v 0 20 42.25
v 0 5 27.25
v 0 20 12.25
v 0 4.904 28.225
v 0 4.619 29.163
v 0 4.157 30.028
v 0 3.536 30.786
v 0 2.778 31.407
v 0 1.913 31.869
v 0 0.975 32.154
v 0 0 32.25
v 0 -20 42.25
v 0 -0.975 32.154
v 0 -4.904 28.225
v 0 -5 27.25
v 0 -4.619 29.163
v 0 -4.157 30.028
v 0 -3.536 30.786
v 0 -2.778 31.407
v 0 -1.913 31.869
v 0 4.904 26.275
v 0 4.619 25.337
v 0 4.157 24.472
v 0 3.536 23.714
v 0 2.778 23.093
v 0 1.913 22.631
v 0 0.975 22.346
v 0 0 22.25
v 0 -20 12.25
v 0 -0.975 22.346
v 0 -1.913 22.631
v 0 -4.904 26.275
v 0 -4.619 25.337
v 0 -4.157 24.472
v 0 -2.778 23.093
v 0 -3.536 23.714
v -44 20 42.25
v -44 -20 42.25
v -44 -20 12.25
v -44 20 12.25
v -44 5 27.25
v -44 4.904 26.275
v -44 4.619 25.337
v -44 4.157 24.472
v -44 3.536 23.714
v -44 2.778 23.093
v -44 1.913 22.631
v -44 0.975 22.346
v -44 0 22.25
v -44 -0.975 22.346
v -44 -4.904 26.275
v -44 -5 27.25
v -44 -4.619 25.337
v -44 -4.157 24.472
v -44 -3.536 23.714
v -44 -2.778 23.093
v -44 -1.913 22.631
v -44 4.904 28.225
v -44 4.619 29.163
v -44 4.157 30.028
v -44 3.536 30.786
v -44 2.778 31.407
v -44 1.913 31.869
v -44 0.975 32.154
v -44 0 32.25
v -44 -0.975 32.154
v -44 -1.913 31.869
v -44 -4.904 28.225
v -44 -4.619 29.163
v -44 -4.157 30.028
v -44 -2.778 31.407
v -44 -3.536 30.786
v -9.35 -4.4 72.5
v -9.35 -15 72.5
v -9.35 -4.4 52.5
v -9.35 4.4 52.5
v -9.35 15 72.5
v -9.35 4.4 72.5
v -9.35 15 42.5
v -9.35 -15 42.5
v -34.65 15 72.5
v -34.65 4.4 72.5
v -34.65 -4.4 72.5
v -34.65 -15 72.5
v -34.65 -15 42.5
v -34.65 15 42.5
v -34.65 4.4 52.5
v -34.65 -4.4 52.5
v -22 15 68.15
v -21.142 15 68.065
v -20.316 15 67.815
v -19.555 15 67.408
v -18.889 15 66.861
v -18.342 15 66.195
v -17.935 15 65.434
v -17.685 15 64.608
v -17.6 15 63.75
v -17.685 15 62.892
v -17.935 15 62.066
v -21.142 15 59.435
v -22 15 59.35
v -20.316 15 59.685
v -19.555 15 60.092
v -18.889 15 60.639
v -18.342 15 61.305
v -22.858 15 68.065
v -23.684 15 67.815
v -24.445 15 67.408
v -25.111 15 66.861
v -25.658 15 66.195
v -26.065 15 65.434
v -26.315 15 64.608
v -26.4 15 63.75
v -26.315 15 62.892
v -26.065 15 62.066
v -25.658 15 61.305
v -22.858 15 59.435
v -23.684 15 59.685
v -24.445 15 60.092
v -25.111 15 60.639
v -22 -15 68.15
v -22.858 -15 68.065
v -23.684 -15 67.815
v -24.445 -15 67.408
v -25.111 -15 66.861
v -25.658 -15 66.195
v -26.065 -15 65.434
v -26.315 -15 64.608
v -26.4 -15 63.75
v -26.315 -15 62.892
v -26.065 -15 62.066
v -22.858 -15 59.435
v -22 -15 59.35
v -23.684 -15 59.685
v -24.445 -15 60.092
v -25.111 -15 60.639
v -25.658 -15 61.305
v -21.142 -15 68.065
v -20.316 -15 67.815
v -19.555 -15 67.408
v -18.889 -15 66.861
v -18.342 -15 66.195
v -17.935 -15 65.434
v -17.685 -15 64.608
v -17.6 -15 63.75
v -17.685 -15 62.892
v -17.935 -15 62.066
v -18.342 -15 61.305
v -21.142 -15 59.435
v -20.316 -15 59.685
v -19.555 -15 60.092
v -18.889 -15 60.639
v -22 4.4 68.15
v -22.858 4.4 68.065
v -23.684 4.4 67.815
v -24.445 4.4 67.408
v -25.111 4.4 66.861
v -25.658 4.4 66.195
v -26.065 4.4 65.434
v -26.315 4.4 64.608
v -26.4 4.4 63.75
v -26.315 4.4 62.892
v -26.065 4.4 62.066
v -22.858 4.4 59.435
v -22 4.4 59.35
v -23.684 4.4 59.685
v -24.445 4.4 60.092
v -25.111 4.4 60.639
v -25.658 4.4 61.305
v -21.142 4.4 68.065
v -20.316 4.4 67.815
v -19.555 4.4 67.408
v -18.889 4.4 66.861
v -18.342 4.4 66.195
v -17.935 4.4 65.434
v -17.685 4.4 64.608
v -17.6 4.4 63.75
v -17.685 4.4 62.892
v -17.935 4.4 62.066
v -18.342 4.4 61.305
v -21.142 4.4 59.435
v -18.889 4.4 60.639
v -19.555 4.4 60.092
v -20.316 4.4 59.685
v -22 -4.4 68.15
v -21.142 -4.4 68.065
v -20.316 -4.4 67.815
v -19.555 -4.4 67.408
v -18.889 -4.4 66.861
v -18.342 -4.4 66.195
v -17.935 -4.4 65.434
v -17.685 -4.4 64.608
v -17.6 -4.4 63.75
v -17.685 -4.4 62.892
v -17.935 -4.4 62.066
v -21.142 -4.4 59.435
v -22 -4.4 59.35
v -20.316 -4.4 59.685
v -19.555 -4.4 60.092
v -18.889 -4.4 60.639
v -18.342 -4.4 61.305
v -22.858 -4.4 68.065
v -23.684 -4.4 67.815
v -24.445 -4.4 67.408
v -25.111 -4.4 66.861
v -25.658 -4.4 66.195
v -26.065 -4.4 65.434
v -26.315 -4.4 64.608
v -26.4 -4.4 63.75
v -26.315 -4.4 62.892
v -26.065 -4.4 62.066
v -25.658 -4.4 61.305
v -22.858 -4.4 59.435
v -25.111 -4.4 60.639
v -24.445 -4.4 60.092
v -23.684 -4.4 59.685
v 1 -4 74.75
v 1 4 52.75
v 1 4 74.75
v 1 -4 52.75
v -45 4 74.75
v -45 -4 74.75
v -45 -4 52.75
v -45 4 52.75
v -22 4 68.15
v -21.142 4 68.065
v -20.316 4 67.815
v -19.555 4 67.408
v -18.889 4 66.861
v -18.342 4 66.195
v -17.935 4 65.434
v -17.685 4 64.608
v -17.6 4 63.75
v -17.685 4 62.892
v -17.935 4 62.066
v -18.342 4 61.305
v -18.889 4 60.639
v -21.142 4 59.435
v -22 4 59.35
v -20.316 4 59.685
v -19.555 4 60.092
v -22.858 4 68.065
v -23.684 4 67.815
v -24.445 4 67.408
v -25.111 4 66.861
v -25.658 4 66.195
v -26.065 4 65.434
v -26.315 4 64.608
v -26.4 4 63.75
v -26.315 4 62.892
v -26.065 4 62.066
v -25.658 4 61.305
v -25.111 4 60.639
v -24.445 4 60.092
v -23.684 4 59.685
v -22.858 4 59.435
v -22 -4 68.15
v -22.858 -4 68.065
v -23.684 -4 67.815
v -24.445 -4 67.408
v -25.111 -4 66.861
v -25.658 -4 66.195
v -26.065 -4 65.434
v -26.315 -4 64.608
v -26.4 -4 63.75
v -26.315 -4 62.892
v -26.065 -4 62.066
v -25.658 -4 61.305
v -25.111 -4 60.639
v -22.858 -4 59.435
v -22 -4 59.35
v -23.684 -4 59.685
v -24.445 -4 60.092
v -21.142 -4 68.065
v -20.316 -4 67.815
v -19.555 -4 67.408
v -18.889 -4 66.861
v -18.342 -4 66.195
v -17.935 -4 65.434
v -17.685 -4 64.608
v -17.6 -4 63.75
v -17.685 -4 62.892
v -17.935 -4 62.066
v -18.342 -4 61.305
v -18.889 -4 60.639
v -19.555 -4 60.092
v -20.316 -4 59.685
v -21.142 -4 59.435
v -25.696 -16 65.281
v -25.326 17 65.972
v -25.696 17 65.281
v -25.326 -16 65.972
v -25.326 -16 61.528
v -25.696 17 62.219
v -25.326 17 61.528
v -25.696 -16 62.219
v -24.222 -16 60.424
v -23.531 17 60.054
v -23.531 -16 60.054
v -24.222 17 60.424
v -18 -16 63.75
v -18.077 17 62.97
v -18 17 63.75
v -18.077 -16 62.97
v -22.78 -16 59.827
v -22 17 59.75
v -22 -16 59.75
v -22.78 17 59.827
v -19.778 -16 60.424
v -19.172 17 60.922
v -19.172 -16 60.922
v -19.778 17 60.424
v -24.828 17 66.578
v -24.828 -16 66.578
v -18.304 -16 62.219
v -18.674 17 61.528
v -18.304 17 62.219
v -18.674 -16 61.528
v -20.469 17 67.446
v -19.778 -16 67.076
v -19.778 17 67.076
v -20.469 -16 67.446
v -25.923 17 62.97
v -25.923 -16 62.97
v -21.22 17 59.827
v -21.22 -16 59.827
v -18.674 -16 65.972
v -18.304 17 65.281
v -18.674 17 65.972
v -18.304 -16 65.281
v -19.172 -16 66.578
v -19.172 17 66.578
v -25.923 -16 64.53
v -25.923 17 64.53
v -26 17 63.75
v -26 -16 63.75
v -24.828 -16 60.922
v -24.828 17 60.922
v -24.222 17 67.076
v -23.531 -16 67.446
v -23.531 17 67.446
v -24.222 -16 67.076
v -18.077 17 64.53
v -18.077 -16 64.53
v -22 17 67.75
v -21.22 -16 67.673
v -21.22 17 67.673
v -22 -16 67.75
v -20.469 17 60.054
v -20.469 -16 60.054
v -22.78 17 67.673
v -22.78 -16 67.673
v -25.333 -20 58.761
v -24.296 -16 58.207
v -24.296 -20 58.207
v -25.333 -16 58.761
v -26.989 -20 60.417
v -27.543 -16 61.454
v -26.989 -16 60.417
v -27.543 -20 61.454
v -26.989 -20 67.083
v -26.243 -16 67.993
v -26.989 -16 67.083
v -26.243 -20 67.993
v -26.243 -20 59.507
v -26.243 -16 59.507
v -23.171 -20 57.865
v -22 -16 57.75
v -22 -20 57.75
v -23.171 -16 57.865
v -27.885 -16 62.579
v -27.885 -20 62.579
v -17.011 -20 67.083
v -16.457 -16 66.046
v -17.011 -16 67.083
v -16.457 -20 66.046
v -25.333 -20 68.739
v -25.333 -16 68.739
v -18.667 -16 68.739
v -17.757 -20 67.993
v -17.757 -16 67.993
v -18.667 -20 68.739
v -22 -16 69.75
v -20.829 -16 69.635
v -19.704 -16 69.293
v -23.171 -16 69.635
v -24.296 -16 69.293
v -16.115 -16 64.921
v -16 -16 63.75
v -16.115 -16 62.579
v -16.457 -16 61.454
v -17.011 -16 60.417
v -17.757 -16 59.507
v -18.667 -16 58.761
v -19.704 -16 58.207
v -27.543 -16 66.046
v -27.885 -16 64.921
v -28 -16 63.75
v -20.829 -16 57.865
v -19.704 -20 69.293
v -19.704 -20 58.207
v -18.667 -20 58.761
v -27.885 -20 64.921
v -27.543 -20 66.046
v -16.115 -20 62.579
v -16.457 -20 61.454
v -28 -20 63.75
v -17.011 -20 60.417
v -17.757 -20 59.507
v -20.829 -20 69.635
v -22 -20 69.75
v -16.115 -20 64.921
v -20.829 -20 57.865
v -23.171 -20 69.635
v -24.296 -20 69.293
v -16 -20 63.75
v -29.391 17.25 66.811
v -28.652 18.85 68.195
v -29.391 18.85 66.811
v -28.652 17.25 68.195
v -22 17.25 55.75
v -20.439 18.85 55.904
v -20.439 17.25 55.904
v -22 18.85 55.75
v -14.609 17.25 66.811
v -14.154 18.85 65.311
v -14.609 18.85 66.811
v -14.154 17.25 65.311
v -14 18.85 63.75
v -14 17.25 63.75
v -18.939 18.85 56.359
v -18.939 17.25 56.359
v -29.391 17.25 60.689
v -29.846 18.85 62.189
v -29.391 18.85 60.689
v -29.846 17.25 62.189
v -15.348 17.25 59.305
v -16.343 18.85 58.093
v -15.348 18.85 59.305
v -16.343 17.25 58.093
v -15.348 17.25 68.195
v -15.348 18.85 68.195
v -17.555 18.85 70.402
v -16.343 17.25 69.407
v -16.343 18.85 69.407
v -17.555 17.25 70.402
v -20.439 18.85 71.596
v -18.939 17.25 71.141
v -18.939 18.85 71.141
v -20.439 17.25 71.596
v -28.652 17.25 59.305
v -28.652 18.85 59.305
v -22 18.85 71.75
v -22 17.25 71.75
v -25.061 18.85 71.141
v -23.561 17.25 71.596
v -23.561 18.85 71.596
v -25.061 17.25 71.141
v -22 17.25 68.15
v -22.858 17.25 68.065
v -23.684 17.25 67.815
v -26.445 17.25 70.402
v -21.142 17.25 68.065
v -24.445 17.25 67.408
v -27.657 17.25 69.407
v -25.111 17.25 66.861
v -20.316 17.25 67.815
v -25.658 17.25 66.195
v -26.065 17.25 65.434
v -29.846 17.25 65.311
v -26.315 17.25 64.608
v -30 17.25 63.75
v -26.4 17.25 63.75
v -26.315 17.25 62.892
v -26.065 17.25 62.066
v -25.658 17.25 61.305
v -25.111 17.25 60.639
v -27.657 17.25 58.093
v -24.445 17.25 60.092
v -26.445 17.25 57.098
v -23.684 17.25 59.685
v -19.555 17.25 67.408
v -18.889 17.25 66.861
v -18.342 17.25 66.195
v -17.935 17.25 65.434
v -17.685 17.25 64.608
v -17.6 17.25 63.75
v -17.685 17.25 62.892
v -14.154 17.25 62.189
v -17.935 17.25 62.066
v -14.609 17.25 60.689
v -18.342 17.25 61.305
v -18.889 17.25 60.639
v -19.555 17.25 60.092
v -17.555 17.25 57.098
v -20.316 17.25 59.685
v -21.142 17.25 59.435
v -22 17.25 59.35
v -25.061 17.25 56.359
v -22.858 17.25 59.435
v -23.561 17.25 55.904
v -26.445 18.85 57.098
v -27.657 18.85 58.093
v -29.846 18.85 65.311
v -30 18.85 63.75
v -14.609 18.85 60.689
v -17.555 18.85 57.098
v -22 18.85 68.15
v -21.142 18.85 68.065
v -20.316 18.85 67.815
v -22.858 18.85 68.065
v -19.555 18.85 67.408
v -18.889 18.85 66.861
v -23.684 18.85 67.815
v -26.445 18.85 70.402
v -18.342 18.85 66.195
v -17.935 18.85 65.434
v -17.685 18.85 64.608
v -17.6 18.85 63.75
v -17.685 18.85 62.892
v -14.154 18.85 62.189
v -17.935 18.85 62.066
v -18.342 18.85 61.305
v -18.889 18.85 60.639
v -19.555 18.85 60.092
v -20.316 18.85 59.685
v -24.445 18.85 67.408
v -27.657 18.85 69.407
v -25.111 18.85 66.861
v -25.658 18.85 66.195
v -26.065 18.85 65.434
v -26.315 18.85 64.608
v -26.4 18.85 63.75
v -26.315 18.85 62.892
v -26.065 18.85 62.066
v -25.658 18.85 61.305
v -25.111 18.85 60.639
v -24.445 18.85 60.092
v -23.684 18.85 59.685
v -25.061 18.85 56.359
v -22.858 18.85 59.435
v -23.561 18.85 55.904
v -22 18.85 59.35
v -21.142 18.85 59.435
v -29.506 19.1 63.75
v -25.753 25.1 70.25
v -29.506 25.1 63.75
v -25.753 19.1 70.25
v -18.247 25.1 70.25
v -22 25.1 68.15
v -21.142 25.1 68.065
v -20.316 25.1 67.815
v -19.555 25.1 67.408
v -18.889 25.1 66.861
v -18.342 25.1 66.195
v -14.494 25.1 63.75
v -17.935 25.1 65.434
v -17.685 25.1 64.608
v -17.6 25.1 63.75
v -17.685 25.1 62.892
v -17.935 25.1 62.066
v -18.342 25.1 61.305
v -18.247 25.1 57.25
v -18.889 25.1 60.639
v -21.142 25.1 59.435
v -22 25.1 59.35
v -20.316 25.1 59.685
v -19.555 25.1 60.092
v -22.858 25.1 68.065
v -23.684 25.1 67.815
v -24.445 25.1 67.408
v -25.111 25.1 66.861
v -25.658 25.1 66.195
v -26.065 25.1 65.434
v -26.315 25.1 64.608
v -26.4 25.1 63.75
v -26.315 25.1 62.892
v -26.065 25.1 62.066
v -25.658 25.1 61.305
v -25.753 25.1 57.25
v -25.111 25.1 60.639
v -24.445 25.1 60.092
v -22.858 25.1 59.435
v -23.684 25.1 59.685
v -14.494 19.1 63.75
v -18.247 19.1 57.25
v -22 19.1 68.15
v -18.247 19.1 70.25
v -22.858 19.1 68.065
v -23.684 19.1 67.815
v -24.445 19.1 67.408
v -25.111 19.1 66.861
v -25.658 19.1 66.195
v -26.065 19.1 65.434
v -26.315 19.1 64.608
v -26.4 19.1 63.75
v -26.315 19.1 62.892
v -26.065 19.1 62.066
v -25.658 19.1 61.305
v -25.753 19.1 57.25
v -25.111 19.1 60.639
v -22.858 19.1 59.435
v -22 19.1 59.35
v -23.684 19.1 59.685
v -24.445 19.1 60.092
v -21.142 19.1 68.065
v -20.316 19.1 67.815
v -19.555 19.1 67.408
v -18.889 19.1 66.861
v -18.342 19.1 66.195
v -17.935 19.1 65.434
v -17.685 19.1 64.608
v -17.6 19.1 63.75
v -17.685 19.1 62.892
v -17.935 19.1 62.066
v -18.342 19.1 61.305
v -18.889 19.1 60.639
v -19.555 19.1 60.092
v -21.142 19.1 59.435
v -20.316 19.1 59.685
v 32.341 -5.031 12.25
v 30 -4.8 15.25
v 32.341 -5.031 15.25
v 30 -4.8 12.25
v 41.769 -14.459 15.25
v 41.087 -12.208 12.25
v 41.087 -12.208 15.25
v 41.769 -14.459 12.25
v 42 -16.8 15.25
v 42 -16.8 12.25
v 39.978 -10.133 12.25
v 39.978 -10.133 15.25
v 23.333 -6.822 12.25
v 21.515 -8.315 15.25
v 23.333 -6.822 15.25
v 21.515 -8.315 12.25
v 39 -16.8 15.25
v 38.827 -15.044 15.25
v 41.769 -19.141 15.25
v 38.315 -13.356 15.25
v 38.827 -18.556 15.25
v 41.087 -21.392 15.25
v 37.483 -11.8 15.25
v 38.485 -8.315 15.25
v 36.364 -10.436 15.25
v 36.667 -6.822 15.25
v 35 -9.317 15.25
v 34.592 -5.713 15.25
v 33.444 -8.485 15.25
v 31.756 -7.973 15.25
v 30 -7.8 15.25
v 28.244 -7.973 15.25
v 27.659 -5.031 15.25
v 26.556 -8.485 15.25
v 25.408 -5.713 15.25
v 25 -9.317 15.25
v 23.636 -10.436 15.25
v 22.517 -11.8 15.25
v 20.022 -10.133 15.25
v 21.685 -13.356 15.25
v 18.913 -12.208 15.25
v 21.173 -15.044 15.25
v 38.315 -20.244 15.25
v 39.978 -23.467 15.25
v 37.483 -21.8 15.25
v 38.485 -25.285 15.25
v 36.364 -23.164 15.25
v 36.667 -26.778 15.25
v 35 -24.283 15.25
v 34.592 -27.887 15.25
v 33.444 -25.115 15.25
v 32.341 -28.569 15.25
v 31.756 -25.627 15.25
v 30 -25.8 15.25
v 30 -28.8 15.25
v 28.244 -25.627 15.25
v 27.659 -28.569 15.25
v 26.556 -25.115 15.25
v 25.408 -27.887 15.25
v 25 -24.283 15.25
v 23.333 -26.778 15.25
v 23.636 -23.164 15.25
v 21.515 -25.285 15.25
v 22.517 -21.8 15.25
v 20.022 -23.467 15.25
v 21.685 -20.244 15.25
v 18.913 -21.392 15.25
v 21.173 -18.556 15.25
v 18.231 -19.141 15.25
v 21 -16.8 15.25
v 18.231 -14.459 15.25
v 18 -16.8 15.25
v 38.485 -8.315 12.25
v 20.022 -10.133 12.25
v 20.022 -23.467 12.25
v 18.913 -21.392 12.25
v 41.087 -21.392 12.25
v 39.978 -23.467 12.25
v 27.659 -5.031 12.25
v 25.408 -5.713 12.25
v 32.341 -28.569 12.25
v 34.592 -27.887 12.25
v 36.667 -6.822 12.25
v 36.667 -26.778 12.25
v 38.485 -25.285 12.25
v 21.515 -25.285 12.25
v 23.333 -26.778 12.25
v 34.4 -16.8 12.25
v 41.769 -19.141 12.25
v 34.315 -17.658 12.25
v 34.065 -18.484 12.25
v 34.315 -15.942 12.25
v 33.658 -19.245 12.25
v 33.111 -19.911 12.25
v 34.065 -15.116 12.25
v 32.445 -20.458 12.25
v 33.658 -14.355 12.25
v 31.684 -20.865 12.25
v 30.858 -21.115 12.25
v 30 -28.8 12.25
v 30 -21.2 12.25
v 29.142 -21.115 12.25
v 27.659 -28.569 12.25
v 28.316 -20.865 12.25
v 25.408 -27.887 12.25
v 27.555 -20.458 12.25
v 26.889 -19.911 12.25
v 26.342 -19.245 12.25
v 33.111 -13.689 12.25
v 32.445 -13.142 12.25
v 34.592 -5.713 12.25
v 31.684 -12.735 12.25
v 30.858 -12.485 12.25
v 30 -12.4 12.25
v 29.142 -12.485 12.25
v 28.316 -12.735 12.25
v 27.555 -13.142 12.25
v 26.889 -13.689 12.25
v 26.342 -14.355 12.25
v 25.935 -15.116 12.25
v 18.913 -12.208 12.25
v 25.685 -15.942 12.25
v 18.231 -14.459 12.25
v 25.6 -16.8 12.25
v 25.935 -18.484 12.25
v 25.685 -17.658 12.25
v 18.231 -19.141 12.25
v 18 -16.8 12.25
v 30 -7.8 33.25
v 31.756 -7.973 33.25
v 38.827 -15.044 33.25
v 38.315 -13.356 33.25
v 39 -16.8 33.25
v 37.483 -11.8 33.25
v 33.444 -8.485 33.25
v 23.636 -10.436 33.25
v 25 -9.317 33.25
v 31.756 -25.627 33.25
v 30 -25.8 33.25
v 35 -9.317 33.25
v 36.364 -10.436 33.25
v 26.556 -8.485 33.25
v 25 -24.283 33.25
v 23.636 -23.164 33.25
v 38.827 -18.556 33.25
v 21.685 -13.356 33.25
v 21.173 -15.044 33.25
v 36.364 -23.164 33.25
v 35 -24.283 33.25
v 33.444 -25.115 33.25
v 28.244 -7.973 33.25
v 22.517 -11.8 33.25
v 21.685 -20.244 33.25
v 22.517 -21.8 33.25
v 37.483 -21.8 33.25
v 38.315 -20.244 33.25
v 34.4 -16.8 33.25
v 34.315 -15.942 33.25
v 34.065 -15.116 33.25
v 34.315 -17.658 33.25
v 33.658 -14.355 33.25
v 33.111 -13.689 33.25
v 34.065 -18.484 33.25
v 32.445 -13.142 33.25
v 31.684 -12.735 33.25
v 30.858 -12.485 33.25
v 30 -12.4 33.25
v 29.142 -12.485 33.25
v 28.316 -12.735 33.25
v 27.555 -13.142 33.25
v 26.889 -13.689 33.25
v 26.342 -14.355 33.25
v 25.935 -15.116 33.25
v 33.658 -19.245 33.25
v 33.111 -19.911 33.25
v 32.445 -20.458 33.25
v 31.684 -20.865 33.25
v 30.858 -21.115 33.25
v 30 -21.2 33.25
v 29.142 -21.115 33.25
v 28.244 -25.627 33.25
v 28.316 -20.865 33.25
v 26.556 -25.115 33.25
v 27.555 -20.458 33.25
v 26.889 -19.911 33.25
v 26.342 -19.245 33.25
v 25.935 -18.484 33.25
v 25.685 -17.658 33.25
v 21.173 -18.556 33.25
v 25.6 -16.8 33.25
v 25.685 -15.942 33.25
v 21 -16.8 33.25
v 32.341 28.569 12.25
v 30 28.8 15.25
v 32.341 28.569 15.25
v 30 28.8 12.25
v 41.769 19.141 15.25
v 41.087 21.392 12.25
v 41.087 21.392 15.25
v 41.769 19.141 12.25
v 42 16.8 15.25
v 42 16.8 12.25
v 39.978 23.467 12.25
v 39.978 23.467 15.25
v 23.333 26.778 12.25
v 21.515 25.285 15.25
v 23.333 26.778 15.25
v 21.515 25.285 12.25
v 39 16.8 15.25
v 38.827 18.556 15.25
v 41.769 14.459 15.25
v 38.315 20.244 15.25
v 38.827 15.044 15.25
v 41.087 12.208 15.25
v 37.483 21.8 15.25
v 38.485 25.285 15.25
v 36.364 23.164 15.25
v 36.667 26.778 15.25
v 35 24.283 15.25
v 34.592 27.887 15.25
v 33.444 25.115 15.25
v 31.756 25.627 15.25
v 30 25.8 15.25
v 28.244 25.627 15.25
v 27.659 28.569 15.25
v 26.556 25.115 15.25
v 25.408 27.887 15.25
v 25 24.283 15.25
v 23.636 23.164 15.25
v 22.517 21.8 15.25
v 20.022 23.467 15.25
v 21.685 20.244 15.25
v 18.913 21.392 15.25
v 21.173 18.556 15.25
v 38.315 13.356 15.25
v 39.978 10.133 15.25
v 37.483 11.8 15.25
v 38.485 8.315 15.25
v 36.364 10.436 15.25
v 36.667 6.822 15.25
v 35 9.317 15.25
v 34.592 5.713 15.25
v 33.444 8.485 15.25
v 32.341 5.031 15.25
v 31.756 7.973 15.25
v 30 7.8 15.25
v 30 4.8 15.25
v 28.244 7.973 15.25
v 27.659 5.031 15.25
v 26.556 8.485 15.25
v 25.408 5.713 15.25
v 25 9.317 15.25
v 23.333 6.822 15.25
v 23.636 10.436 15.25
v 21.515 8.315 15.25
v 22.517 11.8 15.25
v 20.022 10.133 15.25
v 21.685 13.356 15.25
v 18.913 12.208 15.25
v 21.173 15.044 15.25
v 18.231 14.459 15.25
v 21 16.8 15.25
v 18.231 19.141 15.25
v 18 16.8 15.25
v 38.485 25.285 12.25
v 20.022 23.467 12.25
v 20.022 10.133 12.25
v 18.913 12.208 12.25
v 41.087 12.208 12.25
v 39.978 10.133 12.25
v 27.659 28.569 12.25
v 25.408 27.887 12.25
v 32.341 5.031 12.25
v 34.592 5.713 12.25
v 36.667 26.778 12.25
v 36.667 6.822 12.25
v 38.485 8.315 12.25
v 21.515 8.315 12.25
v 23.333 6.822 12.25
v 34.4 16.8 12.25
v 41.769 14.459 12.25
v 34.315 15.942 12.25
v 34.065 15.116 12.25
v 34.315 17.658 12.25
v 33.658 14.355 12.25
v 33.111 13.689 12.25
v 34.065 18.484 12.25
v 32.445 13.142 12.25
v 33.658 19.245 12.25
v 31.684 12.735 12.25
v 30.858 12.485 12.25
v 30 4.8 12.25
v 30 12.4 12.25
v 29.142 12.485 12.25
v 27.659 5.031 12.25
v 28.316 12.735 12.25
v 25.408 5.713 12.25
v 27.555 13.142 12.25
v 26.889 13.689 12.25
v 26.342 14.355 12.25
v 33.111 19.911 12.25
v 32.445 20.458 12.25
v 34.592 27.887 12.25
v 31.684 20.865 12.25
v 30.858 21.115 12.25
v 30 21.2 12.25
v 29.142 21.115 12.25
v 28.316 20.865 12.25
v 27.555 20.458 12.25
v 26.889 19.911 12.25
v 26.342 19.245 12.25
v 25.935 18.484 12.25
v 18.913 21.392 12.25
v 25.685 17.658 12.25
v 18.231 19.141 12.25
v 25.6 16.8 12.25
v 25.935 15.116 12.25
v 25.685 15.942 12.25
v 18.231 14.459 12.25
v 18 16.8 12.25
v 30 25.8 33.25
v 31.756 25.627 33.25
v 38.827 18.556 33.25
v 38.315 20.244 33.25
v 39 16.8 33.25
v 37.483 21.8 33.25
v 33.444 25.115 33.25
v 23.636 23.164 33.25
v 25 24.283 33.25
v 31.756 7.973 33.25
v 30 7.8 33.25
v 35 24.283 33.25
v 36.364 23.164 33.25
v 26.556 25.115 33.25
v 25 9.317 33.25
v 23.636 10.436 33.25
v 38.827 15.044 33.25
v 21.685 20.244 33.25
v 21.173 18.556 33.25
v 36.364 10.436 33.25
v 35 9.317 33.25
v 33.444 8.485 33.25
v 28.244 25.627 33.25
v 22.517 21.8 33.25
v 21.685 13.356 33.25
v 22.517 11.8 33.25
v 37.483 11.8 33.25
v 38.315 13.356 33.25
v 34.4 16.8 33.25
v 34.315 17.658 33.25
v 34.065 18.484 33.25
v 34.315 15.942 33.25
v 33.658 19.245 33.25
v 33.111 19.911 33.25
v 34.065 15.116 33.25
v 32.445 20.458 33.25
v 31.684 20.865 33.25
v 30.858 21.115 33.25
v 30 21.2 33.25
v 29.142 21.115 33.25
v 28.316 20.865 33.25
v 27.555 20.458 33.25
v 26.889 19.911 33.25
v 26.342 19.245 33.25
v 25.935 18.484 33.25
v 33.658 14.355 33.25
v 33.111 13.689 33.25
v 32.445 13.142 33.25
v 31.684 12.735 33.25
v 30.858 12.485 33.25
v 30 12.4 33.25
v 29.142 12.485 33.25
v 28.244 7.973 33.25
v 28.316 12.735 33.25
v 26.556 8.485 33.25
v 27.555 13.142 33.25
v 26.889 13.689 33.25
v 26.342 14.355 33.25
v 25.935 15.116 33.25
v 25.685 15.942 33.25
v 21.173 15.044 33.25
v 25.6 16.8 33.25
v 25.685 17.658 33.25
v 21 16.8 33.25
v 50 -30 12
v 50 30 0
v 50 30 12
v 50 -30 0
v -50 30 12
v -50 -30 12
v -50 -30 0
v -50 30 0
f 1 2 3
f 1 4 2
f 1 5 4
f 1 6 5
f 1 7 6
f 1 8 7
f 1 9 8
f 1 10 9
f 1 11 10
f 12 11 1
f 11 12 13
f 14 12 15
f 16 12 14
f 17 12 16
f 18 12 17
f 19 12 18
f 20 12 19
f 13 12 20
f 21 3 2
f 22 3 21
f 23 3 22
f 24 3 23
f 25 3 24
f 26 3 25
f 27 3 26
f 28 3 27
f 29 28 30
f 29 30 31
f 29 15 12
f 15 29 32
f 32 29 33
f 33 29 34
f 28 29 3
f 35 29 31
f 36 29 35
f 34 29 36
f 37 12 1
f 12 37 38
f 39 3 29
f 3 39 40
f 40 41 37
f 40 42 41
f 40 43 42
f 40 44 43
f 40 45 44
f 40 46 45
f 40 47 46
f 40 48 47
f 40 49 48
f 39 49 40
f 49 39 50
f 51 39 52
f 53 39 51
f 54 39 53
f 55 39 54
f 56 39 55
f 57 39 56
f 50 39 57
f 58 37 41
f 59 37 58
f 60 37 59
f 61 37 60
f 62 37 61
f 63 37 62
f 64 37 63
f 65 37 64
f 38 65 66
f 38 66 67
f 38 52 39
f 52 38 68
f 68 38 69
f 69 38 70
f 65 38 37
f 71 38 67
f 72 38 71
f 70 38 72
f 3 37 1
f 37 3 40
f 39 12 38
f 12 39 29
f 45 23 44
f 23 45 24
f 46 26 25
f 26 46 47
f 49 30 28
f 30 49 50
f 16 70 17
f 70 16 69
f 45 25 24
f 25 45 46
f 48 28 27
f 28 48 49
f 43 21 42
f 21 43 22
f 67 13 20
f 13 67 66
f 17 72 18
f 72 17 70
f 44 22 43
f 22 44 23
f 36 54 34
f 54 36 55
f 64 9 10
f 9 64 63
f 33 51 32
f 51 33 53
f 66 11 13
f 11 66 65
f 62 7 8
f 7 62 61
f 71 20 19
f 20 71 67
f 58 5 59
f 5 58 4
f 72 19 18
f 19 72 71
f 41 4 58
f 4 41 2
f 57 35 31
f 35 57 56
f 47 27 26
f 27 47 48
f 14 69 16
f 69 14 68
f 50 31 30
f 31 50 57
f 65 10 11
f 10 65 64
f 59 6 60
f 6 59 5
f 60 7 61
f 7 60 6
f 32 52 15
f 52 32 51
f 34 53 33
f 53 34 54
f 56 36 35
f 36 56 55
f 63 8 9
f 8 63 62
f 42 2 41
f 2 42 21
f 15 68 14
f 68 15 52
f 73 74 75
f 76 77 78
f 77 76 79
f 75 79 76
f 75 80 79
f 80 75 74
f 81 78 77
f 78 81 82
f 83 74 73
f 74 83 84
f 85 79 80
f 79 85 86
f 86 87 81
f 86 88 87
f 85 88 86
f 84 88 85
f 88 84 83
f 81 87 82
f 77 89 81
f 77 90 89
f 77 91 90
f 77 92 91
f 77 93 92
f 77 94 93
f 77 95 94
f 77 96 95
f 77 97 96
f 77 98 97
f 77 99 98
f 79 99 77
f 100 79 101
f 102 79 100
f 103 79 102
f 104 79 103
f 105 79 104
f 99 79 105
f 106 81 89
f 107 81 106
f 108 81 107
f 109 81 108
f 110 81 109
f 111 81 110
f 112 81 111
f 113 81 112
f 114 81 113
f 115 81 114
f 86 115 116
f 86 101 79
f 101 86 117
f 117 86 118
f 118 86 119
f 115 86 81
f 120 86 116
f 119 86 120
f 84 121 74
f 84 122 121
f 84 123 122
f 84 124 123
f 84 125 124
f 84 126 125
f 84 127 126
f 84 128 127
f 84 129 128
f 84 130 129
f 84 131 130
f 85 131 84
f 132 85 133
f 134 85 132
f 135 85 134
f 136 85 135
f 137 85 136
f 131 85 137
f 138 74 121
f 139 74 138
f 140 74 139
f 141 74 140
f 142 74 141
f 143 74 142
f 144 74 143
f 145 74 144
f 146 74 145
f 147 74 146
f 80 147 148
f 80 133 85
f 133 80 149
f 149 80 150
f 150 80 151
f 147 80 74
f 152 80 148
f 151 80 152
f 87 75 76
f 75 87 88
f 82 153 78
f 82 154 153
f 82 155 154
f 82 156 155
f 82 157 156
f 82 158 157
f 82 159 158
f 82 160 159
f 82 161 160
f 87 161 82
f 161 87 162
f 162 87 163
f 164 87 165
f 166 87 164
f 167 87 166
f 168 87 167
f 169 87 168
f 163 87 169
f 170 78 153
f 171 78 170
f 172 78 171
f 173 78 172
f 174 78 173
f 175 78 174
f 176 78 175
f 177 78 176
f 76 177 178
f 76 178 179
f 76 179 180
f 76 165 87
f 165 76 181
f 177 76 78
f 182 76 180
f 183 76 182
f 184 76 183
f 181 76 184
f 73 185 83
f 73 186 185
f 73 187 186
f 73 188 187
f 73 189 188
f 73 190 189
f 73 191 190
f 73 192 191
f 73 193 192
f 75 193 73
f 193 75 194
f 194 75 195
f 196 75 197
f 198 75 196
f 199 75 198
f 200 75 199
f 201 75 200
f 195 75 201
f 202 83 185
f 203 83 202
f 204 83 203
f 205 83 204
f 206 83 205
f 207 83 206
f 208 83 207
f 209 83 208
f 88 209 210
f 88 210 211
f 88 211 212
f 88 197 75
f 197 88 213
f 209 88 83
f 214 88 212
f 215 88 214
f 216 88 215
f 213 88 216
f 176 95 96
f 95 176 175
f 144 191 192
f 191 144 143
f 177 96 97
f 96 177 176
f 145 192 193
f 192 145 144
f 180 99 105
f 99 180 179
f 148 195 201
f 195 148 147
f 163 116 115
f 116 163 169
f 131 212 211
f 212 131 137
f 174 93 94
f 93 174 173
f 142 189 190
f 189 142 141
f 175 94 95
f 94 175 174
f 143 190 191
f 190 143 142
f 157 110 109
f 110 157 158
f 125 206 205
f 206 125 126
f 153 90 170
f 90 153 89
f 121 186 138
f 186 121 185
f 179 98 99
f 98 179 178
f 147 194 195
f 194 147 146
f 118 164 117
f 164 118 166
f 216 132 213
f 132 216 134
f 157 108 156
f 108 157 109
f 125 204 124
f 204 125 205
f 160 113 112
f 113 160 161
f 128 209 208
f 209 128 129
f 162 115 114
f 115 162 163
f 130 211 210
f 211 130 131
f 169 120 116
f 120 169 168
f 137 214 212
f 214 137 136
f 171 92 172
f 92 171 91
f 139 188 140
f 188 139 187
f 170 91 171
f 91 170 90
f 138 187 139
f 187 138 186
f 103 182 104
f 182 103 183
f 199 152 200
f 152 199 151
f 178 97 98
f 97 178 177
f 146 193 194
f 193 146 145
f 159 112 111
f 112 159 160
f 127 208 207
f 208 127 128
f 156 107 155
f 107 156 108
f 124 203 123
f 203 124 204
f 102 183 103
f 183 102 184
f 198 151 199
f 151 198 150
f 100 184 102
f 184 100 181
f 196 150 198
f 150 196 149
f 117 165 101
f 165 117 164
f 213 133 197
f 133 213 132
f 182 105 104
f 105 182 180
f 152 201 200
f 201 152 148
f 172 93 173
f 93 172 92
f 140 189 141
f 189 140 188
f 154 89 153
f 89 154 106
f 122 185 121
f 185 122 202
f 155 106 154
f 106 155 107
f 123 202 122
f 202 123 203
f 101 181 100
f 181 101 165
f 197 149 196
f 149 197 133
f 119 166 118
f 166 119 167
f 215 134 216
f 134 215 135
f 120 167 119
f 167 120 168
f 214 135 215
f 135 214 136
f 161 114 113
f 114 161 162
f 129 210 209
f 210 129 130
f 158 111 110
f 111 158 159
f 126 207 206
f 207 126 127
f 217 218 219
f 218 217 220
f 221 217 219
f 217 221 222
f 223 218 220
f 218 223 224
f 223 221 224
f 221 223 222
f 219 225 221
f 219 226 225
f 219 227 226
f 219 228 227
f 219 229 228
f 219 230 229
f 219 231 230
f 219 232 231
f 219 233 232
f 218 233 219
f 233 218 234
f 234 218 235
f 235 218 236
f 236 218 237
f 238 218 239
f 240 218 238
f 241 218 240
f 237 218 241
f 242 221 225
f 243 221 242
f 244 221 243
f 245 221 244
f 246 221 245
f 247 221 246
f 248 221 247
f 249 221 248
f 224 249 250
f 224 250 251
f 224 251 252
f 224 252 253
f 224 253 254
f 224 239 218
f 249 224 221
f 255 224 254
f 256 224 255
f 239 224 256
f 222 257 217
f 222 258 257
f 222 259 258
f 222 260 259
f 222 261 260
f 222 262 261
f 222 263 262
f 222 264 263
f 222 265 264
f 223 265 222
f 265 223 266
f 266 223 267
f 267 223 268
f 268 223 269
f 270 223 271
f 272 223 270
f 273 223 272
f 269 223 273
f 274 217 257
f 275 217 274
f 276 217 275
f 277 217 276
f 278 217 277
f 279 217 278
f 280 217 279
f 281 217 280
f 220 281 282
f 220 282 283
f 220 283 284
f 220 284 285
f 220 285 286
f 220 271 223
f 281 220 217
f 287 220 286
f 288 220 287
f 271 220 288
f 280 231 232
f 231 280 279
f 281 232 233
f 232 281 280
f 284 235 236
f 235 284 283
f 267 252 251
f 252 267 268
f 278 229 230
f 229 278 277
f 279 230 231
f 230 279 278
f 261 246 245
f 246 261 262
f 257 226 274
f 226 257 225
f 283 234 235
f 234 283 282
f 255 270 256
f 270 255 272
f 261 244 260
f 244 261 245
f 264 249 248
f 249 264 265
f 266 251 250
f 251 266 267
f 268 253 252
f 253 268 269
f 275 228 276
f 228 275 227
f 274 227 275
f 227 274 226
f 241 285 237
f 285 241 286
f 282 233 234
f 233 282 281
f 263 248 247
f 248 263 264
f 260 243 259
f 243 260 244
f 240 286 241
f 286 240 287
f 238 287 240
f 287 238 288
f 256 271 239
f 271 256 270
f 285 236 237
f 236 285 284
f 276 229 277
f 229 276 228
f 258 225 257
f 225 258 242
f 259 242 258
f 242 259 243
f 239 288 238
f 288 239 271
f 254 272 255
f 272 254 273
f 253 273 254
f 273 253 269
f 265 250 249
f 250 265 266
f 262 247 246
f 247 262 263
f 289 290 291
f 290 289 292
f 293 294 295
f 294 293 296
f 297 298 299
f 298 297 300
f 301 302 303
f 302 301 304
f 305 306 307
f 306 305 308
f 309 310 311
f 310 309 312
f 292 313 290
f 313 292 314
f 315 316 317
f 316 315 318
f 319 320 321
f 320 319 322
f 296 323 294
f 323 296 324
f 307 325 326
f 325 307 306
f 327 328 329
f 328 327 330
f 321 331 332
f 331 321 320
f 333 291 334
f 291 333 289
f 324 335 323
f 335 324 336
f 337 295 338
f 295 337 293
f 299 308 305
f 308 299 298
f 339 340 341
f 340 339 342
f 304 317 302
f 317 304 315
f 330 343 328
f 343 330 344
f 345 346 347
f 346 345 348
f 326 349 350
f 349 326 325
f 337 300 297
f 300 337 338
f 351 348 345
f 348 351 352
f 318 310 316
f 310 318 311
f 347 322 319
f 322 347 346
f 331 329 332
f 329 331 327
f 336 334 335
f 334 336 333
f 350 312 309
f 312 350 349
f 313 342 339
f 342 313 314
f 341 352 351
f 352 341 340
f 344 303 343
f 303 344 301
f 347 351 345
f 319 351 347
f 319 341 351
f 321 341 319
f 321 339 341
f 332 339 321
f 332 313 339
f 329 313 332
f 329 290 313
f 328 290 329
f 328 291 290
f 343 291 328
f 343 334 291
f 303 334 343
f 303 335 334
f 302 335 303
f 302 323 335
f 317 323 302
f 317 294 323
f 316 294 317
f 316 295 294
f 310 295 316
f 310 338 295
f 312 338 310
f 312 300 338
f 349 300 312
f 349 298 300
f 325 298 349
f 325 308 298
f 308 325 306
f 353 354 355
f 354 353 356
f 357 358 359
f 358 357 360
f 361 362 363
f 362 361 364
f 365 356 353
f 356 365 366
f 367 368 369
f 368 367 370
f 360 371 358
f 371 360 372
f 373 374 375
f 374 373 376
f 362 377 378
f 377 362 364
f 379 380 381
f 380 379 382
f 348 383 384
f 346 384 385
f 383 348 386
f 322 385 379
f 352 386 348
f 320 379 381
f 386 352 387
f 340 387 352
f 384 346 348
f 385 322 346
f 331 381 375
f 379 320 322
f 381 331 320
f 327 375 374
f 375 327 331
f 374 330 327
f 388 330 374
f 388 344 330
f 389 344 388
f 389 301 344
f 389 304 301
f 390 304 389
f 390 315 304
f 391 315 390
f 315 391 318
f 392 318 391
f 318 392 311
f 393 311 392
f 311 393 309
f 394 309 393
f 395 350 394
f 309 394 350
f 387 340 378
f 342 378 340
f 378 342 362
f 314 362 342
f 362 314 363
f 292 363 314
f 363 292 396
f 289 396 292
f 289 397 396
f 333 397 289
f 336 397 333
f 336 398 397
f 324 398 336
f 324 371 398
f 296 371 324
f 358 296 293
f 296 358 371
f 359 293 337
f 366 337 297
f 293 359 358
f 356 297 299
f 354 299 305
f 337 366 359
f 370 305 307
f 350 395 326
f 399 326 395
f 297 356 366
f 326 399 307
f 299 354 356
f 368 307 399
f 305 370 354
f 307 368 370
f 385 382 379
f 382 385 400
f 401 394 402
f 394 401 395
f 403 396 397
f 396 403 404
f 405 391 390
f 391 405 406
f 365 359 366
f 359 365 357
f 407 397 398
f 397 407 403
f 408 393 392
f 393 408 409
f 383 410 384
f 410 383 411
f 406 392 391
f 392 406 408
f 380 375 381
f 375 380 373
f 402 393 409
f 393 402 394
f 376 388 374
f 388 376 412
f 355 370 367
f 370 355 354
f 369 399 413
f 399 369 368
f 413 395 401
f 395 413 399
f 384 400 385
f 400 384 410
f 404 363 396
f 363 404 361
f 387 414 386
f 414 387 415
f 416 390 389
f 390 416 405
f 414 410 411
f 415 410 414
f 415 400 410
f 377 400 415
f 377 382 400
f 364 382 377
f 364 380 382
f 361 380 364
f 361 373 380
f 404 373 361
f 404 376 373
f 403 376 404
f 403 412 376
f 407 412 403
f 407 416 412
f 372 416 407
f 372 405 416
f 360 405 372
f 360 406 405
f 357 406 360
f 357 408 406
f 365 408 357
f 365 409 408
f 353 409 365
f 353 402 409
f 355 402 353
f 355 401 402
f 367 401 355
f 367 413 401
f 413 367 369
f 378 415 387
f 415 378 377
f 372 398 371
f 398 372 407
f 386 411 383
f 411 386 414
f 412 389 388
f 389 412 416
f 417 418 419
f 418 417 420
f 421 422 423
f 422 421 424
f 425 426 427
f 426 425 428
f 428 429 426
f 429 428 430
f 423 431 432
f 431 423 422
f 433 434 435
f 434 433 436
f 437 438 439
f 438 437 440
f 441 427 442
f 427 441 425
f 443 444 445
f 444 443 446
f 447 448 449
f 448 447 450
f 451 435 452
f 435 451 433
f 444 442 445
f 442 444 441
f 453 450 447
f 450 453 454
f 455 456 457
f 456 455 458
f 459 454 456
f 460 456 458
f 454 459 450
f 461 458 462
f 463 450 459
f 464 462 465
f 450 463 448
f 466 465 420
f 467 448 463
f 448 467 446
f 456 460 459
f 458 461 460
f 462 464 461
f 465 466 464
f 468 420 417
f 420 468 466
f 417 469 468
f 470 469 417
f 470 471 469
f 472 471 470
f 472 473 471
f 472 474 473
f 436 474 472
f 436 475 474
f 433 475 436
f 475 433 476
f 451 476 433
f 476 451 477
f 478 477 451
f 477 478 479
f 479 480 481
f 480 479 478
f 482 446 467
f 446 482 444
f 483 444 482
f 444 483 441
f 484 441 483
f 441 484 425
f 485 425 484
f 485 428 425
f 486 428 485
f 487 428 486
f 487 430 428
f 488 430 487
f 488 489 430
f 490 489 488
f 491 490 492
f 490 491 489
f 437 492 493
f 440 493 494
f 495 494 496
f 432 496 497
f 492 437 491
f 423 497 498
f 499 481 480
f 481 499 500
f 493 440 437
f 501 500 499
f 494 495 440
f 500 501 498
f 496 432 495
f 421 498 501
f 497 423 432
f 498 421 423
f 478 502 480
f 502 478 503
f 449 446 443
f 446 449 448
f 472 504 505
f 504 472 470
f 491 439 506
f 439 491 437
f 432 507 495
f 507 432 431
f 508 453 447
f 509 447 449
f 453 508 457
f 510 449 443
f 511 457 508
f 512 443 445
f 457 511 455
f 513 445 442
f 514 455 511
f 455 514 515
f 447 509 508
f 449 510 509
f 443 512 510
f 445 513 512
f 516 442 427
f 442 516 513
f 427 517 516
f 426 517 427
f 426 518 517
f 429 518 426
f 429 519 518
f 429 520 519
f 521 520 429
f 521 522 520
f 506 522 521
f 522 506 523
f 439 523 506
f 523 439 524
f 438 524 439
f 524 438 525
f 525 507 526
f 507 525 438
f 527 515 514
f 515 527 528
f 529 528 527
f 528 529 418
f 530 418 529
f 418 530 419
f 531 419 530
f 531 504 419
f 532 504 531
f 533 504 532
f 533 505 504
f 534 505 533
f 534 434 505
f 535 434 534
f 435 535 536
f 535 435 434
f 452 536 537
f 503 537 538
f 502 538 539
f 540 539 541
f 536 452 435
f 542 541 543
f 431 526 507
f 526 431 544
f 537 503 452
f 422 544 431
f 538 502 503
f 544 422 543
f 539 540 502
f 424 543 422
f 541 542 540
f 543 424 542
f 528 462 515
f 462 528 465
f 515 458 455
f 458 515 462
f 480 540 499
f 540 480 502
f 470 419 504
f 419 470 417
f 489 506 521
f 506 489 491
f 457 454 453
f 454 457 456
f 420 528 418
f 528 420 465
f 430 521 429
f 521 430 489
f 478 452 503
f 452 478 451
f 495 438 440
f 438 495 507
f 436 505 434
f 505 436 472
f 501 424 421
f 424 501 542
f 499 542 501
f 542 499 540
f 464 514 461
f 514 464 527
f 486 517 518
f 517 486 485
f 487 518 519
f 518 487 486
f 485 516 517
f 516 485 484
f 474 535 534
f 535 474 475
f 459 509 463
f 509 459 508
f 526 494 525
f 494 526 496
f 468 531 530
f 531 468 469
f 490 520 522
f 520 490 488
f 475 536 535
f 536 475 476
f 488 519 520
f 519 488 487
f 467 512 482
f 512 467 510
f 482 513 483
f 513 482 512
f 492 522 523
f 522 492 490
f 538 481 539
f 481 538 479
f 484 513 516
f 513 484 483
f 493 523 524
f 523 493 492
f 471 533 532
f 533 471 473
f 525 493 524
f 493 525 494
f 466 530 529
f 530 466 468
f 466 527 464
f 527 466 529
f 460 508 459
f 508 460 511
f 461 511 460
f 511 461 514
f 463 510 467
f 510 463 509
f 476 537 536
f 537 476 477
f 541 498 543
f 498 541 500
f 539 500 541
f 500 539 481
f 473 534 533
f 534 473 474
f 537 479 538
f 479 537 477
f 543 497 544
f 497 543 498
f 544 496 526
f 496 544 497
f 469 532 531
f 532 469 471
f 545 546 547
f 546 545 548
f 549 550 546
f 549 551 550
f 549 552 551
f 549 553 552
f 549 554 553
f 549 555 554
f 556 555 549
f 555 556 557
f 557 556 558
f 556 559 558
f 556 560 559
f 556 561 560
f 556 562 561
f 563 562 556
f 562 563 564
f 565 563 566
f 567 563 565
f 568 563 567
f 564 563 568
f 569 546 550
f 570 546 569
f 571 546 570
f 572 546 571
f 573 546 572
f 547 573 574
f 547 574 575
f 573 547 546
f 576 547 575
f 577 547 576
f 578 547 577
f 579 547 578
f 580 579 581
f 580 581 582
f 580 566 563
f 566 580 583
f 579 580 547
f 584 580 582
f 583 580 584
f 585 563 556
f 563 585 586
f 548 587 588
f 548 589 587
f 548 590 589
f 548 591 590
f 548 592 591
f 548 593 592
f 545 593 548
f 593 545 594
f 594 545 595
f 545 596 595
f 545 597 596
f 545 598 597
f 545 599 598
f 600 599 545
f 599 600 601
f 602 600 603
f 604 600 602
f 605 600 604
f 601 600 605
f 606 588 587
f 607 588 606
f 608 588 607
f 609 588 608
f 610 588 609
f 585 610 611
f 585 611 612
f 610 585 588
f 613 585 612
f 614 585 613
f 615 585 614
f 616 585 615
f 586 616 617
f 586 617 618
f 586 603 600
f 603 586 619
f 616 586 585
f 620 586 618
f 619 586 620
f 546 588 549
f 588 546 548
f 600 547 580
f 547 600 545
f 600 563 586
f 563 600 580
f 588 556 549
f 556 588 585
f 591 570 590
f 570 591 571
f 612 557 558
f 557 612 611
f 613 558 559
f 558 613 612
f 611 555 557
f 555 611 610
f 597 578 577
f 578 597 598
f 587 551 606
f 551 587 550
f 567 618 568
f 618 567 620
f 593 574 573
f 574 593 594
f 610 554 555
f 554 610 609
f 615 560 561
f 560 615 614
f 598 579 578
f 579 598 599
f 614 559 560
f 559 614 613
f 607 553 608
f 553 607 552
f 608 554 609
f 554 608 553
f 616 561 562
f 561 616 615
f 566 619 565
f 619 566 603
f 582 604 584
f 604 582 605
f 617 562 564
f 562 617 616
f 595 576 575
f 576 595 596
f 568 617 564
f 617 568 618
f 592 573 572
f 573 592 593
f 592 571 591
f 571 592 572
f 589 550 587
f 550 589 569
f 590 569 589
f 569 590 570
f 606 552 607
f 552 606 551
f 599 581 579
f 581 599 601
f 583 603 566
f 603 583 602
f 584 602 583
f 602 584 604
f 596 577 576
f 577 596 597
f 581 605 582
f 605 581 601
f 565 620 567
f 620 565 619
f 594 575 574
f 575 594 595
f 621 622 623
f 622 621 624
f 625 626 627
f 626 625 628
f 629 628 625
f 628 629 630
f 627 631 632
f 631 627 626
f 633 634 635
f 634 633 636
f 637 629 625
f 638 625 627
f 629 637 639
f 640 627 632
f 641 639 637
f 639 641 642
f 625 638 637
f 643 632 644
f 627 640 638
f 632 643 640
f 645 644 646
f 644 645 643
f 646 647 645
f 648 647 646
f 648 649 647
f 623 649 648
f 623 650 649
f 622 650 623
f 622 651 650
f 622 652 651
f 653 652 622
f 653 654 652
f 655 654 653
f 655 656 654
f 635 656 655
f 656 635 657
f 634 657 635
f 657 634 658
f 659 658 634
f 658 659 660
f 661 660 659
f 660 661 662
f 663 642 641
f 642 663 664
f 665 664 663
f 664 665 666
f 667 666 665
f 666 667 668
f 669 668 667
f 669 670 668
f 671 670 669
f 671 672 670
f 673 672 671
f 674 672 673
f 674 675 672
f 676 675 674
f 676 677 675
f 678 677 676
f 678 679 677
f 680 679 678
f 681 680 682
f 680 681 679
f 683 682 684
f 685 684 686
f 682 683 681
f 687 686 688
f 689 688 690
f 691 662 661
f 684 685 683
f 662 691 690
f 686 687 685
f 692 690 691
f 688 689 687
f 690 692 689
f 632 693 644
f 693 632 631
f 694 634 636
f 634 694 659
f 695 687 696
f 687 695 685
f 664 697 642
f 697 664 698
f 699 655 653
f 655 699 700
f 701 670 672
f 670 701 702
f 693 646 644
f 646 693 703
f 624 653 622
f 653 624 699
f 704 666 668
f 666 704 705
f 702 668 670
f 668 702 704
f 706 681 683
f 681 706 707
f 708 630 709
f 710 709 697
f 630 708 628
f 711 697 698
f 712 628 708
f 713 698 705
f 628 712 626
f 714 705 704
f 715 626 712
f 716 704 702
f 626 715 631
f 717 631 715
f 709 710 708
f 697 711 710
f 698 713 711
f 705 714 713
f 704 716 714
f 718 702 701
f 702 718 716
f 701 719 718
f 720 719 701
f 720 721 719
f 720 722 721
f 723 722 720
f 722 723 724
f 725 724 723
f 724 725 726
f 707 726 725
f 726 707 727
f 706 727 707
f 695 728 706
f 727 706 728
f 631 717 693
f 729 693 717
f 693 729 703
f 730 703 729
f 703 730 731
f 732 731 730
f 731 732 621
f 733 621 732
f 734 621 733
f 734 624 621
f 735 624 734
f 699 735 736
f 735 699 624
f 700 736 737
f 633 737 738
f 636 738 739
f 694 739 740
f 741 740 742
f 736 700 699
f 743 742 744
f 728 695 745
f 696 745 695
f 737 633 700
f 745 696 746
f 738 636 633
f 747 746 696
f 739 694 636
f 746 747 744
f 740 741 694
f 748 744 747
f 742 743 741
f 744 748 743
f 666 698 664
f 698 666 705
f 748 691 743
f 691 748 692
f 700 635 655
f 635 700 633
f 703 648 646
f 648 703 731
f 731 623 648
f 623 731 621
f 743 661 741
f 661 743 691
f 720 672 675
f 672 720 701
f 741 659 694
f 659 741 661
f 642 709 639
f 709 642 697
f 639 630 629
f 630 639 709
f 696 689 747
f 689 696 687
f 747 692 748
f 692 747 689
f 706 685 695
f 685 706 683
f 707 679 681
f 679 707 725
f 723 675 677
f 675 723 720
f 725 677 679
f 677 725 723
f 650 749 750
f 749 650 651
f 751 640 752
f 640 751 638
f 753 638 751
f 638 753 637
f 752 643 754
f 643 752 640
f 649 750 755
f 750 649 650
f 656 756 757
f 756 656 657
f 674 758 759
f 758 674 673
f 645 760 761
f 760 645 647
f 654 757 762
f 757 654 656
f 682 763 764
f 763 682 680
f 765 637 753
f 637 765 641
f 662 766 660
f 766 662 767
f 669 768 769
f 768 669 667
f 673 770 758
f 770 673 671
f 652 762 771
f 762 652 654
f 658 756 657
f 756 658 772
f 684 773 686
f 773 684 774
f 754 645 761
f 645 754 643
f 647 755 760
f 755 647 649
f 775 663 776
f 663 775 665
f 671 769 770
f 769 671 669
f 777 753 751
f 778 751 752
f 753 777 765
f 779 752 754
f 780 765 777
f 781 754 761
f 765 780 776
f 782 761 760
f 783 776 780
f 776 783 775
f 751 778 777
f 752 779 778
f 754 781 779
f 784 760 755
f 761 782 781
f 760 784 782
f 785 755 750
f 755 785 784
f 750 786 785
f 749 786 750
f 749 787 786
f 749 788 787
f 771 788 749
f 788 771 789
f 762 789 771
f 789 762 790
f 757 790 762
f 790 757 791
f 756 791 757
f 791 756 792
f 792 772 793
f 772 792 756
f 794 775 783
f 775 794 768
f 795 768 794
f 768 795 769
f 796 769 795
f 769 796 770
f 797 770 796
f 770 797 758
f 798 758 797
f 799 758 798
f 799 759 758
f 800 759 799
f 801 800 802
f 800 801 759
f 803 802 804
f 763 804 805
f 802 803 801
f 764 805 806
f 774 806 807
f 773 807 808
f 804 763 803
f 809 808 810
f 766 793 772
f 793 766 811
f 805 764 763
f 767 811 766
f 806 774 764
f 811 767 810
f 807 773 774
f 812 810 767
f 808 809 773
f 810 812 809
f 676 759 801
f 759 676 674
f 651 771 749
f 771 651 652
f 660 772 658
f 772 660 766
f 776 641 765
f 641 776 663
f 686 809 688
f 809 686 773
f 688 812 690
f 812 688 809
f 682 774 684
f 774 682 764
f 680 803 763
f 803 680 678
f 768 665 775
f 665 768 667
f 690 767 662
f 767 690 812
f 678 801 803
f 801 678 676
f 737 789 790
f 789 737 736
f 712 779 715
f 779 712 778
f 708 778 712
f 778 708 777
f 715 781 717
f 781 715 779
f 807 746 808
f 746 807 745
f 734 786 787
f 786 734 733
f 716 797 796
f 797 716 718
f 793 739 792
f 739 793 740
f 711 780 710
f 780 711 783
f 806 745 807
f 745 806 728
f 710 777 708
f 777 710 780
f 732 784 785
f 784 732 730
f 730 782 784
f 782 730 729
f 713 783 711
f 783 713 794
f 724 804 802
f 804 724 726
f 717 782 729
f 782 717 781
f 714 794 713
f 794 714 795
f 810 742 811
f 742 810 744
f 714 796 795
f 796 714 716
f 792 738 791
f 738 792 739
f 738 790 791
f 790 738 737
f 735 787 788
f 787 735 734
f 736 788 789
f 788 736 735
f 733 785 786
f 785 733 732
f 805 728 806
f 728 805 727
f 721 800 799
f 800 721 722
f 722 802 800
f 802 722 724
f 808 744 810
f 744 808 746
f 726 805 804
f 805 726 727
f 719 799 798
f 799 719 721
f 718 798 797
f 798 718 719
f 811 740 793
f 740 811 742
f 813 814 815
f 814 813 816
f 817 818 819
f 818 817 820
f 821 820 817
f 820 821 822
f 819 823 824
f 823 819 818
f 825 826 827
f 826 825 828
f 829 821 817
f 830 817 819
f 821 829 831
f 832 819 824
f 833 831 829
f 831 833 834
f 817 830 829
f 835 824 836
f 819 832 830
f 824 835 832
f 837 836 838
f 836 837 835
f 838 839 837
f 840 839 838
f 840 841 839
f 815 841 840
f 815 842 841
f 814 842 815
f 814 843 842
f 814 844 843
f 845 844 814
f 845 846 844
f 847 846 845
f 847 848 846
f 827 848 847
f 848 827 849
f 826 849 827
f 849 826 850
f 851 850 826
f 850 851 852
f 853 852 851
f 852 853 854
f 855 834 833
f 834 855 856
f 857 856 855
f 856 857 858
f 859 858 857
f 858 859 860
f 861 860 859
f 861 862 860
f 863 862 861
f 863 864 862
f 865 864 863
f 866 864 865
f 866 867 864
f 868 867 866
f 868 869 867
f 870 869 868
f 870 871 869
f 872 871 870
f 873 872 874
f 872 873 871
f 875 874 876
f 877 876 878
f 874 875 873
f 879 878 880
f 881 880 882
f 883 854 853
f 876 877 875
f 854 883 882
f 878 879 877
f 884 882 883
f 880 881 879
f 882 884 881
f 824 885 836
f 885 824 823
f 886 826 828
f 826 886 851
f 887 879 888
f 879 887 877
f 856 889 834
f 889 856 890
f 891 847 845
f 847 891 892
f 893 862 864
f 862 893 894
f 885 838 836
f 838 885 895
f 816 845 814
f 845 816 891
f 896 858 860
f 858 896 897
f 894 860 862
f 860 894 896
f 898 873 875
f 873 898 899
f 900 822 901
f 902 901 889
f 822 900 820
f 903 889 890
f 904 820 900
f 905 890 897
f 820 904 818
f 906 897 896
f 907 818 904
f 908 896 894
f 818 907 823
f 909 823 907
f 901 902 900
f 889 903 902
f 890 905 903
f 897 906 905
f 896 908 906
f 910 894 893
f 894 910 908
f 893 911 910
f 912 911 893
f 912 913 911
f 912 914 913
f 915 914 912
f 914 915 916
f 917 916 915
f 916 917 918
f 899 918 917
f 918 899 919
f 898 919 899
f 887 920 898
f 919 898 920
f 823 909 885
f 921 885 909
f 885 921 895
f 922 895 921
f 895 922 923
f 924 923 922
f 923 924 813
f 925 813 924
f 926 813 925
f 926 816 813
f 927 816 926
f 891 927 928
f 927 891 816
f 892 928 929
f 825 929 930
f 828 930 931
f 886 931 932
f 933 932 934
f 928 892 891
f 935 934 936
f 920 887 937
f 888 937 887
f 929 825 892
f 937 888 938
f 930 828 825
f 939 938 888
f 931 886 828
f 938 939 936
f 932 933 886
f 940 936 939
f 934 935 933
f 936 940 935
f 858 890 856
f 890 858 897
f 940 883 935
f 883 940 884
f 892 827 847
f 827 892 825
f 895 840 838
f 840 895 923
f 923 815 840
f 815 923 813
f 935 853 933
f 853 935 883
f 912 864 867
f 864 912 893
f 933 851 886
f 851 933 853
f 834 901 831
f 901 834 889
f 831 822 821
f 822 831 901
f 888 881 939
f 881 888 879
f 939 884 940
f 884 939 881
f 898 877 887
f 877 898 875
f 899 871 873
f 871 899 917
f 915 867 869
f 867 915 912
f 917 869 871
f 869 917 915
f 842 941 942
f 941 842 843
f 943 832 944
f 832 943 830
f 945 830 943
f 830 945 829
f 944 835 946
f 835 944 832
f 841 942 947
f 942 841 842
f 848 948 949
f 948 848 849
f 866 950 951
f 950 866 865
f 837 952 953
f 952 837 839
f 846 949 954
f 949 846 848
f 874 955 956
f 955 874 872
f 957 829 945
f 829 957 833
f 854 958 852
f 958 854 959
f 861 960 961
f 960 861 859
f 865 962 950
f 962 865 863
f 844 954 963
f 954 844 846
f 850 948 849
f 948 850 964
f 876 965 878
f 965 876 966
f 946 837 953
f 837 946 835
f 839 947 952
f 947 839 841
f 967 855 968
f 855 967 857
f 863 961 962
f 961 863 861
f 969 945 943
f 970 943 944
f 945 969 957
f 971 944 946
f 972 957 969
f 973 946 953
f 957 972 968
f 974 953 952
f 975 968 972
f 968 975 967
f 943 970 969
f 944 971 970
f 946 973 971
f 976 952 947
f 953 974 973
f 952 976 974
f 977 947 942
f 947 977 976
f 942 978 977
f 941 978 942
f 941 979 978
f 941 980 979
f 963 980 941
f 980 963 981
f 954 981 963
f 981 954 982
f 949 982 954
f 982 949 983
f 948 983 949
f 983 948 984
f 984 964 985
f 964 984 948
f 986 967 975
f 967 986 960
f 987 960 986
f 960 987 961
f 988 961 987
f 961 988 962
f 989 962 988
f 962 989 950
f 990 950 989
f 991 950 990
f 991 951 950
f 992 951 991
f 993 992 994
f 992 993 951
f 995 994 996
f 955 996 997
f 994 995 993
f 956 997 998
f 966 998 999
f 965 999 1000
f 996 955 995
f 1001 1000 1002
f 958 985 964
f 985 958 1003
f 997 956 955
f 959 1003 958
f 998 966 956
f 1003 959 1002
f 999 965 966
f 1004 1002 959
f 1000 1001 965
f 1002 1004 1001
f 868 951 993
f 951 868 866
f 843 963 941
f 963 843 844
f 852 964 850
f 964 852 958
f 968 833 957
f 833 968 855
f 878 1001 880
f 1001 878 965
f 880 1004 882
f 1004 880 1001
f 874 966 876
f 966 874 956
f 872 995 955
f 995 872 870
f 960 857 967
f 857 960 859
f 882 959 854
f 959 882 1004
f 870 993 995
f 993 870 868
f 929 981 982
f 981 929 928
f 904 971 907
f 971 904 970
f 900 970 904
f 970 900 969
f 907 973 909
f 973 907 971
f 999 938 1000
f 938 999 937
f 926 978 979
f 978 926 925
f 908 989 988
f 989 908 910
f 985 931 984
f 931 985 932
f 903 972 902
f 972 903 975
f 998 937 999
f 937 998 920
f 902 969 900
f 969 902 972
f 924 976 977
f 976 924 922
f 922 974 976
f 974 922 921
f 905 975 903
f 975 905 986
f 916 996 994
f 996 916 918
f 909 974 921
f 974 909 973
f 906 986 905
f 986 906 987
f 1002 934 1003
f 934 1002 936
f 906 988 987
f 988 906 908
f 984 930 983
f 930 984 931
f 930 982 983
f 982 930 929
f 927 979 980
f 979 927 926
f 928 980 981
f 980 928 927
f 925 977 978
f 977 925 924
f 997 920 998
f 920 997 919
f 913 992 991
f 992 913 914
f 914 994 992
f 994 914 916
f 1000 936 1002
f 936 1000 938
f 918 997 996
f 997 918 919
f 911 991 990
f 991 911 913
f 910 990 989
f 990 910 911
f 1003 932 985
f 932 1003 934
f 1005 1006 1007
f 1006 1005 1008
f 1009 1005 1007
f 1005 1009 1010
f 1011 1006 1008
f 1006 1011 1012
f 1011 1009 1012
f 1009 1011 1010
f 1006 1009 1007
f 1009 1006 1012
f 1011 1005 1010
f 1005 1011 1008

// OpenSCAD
$fn = 32;

// ------------------------------------------------------------------------
// Indexing jig: plate 100 x 60 mm, pin d8
// Every part is its own module, assembly() places every instance.
// ------------------------------------------------------------------------

// --- part 1 ---
module jig_plate() {
  difference() {
    translate([-50, -30, 0]) cube([100, 60, 12]);
  }
}

// --- part 2 ---
module locator_block() {
  difference() {
    translate([-22, -20, 0]) cube([44, 40, 30]);
    translate([0, 0, 15]) rotate([0, 90, 0]) cylinder(h = 46, d = 10, center = true);
  }
}

// --- part 3 ---
module index_fork() {
  difference() {
    translate([-12.65, -15, 0]) cube([25.3, 30, 30]);
    translate([-13.65, -4.4, 10]) cube([27.3, 8.8, 21]);
    translate([0, 0, 21.25]) rotate([90, 0, 0]) cylinder(h = 32, d = 8.8, center = true);
  }
}

// --- part 4 ---
module index_arm() {
  difference() {
    translate([-23, -4, 0]) cube([46, 8, 22]);
    translate([0, 0, 11]) rotate([90, 0, 0]) cylinder(h = 10, d = 8.8, center = true);
  }
}

// --- part 5 ---
module index_pin() {
  rotate([0, 90, 0]) cylinder(h = 34, d = 8, center = true);
  translate([-20, 0, 0]) rotate([0, 90, 0]) cylinder(h = 4, d = 12);
}

// --- part 6 ---
module pin_washer() {
  difference() {
      translate([0, 0, 0]) cylinder(h = 1.6, d = 16);
      translate([0, 0, -1]) cylinder(h = 3.6, d = 8.8);
    }
}

// --- part 7 ---
module lock_nut() {
  difference() {
    linear_extrude(height = 6) polygon(points = [[7.506, 0], [3.753, 6.5], [-3.753, 6.5], [-7.506, 0], [-3.753, -6.5], [3.753, -6.5]]);
    translate([0, 0, -1]) cylinder(h = 8, d = 8.8);
  }
}

// --- part 8 ---
module guide_bush_a() {
  difference() {
    union() {
      cylinder(h = 3, d = 24);
      translate([0, 0, 3]) cylinder(h = 18, d = 18);
    }
    translate([0, 0, -1]) cylinder(h = 23, d = 8.8);
  }
}

// --- part 9 ---
module guide_bush_b() {
  difference() {
    union() {
      cylinder(h = 3, d = 24);
      translate([0, 0, 3]) cylinder(h = 18, d = 18);
    }
    translate([0, 0, -1]) cylinder(h = 23, d = 8.8);
  }
}

// --- assembly ---
module assembly() {
  color([0.80, 0.24, 0.20]) translate([0, 0, 0]) rotate([0, 0, 0]) jig_plate();
  color([0.20, 0.45, 0.75]) translate([-22, 0, 12.25]) rotate([0, 0, 0]) locator_block();
  color([0.25, 0.62, 0.32]) translate([-22, 0, 42.5]) rotate([0, 0, 0]) index_fork();
  color([0.92, 0.70, 0.18]) translate([-22, 0, 52.75]) rotate([0, 0, 0]) index_arm();
  color([0.58, 0.35, 0.70]) translate([-22, 0, 63.75]) rotate([0, 0, 90]) index_pin();
  color([0.16, 0.66, 0.66]) translate([-22, 18.85, 63.75]) rotate([90, 0, 0]) pin_washer();
  color([0.85, 0.48, 0.18]) translate([-22, 25.1, 63.75]) rotate([90, 0, 0]) lock_nut();
  color([0.55, 0.60, 0.65]) translate([30, -16.8, 12.25]) rotate([0, 0, 0]) guide_bush_a();
  color([0.75, 0.30, 0.55]) translate([30, 16.8, 12.25]) rotate([0, 0, 0]) guide_bush_b();
}

assembly();
